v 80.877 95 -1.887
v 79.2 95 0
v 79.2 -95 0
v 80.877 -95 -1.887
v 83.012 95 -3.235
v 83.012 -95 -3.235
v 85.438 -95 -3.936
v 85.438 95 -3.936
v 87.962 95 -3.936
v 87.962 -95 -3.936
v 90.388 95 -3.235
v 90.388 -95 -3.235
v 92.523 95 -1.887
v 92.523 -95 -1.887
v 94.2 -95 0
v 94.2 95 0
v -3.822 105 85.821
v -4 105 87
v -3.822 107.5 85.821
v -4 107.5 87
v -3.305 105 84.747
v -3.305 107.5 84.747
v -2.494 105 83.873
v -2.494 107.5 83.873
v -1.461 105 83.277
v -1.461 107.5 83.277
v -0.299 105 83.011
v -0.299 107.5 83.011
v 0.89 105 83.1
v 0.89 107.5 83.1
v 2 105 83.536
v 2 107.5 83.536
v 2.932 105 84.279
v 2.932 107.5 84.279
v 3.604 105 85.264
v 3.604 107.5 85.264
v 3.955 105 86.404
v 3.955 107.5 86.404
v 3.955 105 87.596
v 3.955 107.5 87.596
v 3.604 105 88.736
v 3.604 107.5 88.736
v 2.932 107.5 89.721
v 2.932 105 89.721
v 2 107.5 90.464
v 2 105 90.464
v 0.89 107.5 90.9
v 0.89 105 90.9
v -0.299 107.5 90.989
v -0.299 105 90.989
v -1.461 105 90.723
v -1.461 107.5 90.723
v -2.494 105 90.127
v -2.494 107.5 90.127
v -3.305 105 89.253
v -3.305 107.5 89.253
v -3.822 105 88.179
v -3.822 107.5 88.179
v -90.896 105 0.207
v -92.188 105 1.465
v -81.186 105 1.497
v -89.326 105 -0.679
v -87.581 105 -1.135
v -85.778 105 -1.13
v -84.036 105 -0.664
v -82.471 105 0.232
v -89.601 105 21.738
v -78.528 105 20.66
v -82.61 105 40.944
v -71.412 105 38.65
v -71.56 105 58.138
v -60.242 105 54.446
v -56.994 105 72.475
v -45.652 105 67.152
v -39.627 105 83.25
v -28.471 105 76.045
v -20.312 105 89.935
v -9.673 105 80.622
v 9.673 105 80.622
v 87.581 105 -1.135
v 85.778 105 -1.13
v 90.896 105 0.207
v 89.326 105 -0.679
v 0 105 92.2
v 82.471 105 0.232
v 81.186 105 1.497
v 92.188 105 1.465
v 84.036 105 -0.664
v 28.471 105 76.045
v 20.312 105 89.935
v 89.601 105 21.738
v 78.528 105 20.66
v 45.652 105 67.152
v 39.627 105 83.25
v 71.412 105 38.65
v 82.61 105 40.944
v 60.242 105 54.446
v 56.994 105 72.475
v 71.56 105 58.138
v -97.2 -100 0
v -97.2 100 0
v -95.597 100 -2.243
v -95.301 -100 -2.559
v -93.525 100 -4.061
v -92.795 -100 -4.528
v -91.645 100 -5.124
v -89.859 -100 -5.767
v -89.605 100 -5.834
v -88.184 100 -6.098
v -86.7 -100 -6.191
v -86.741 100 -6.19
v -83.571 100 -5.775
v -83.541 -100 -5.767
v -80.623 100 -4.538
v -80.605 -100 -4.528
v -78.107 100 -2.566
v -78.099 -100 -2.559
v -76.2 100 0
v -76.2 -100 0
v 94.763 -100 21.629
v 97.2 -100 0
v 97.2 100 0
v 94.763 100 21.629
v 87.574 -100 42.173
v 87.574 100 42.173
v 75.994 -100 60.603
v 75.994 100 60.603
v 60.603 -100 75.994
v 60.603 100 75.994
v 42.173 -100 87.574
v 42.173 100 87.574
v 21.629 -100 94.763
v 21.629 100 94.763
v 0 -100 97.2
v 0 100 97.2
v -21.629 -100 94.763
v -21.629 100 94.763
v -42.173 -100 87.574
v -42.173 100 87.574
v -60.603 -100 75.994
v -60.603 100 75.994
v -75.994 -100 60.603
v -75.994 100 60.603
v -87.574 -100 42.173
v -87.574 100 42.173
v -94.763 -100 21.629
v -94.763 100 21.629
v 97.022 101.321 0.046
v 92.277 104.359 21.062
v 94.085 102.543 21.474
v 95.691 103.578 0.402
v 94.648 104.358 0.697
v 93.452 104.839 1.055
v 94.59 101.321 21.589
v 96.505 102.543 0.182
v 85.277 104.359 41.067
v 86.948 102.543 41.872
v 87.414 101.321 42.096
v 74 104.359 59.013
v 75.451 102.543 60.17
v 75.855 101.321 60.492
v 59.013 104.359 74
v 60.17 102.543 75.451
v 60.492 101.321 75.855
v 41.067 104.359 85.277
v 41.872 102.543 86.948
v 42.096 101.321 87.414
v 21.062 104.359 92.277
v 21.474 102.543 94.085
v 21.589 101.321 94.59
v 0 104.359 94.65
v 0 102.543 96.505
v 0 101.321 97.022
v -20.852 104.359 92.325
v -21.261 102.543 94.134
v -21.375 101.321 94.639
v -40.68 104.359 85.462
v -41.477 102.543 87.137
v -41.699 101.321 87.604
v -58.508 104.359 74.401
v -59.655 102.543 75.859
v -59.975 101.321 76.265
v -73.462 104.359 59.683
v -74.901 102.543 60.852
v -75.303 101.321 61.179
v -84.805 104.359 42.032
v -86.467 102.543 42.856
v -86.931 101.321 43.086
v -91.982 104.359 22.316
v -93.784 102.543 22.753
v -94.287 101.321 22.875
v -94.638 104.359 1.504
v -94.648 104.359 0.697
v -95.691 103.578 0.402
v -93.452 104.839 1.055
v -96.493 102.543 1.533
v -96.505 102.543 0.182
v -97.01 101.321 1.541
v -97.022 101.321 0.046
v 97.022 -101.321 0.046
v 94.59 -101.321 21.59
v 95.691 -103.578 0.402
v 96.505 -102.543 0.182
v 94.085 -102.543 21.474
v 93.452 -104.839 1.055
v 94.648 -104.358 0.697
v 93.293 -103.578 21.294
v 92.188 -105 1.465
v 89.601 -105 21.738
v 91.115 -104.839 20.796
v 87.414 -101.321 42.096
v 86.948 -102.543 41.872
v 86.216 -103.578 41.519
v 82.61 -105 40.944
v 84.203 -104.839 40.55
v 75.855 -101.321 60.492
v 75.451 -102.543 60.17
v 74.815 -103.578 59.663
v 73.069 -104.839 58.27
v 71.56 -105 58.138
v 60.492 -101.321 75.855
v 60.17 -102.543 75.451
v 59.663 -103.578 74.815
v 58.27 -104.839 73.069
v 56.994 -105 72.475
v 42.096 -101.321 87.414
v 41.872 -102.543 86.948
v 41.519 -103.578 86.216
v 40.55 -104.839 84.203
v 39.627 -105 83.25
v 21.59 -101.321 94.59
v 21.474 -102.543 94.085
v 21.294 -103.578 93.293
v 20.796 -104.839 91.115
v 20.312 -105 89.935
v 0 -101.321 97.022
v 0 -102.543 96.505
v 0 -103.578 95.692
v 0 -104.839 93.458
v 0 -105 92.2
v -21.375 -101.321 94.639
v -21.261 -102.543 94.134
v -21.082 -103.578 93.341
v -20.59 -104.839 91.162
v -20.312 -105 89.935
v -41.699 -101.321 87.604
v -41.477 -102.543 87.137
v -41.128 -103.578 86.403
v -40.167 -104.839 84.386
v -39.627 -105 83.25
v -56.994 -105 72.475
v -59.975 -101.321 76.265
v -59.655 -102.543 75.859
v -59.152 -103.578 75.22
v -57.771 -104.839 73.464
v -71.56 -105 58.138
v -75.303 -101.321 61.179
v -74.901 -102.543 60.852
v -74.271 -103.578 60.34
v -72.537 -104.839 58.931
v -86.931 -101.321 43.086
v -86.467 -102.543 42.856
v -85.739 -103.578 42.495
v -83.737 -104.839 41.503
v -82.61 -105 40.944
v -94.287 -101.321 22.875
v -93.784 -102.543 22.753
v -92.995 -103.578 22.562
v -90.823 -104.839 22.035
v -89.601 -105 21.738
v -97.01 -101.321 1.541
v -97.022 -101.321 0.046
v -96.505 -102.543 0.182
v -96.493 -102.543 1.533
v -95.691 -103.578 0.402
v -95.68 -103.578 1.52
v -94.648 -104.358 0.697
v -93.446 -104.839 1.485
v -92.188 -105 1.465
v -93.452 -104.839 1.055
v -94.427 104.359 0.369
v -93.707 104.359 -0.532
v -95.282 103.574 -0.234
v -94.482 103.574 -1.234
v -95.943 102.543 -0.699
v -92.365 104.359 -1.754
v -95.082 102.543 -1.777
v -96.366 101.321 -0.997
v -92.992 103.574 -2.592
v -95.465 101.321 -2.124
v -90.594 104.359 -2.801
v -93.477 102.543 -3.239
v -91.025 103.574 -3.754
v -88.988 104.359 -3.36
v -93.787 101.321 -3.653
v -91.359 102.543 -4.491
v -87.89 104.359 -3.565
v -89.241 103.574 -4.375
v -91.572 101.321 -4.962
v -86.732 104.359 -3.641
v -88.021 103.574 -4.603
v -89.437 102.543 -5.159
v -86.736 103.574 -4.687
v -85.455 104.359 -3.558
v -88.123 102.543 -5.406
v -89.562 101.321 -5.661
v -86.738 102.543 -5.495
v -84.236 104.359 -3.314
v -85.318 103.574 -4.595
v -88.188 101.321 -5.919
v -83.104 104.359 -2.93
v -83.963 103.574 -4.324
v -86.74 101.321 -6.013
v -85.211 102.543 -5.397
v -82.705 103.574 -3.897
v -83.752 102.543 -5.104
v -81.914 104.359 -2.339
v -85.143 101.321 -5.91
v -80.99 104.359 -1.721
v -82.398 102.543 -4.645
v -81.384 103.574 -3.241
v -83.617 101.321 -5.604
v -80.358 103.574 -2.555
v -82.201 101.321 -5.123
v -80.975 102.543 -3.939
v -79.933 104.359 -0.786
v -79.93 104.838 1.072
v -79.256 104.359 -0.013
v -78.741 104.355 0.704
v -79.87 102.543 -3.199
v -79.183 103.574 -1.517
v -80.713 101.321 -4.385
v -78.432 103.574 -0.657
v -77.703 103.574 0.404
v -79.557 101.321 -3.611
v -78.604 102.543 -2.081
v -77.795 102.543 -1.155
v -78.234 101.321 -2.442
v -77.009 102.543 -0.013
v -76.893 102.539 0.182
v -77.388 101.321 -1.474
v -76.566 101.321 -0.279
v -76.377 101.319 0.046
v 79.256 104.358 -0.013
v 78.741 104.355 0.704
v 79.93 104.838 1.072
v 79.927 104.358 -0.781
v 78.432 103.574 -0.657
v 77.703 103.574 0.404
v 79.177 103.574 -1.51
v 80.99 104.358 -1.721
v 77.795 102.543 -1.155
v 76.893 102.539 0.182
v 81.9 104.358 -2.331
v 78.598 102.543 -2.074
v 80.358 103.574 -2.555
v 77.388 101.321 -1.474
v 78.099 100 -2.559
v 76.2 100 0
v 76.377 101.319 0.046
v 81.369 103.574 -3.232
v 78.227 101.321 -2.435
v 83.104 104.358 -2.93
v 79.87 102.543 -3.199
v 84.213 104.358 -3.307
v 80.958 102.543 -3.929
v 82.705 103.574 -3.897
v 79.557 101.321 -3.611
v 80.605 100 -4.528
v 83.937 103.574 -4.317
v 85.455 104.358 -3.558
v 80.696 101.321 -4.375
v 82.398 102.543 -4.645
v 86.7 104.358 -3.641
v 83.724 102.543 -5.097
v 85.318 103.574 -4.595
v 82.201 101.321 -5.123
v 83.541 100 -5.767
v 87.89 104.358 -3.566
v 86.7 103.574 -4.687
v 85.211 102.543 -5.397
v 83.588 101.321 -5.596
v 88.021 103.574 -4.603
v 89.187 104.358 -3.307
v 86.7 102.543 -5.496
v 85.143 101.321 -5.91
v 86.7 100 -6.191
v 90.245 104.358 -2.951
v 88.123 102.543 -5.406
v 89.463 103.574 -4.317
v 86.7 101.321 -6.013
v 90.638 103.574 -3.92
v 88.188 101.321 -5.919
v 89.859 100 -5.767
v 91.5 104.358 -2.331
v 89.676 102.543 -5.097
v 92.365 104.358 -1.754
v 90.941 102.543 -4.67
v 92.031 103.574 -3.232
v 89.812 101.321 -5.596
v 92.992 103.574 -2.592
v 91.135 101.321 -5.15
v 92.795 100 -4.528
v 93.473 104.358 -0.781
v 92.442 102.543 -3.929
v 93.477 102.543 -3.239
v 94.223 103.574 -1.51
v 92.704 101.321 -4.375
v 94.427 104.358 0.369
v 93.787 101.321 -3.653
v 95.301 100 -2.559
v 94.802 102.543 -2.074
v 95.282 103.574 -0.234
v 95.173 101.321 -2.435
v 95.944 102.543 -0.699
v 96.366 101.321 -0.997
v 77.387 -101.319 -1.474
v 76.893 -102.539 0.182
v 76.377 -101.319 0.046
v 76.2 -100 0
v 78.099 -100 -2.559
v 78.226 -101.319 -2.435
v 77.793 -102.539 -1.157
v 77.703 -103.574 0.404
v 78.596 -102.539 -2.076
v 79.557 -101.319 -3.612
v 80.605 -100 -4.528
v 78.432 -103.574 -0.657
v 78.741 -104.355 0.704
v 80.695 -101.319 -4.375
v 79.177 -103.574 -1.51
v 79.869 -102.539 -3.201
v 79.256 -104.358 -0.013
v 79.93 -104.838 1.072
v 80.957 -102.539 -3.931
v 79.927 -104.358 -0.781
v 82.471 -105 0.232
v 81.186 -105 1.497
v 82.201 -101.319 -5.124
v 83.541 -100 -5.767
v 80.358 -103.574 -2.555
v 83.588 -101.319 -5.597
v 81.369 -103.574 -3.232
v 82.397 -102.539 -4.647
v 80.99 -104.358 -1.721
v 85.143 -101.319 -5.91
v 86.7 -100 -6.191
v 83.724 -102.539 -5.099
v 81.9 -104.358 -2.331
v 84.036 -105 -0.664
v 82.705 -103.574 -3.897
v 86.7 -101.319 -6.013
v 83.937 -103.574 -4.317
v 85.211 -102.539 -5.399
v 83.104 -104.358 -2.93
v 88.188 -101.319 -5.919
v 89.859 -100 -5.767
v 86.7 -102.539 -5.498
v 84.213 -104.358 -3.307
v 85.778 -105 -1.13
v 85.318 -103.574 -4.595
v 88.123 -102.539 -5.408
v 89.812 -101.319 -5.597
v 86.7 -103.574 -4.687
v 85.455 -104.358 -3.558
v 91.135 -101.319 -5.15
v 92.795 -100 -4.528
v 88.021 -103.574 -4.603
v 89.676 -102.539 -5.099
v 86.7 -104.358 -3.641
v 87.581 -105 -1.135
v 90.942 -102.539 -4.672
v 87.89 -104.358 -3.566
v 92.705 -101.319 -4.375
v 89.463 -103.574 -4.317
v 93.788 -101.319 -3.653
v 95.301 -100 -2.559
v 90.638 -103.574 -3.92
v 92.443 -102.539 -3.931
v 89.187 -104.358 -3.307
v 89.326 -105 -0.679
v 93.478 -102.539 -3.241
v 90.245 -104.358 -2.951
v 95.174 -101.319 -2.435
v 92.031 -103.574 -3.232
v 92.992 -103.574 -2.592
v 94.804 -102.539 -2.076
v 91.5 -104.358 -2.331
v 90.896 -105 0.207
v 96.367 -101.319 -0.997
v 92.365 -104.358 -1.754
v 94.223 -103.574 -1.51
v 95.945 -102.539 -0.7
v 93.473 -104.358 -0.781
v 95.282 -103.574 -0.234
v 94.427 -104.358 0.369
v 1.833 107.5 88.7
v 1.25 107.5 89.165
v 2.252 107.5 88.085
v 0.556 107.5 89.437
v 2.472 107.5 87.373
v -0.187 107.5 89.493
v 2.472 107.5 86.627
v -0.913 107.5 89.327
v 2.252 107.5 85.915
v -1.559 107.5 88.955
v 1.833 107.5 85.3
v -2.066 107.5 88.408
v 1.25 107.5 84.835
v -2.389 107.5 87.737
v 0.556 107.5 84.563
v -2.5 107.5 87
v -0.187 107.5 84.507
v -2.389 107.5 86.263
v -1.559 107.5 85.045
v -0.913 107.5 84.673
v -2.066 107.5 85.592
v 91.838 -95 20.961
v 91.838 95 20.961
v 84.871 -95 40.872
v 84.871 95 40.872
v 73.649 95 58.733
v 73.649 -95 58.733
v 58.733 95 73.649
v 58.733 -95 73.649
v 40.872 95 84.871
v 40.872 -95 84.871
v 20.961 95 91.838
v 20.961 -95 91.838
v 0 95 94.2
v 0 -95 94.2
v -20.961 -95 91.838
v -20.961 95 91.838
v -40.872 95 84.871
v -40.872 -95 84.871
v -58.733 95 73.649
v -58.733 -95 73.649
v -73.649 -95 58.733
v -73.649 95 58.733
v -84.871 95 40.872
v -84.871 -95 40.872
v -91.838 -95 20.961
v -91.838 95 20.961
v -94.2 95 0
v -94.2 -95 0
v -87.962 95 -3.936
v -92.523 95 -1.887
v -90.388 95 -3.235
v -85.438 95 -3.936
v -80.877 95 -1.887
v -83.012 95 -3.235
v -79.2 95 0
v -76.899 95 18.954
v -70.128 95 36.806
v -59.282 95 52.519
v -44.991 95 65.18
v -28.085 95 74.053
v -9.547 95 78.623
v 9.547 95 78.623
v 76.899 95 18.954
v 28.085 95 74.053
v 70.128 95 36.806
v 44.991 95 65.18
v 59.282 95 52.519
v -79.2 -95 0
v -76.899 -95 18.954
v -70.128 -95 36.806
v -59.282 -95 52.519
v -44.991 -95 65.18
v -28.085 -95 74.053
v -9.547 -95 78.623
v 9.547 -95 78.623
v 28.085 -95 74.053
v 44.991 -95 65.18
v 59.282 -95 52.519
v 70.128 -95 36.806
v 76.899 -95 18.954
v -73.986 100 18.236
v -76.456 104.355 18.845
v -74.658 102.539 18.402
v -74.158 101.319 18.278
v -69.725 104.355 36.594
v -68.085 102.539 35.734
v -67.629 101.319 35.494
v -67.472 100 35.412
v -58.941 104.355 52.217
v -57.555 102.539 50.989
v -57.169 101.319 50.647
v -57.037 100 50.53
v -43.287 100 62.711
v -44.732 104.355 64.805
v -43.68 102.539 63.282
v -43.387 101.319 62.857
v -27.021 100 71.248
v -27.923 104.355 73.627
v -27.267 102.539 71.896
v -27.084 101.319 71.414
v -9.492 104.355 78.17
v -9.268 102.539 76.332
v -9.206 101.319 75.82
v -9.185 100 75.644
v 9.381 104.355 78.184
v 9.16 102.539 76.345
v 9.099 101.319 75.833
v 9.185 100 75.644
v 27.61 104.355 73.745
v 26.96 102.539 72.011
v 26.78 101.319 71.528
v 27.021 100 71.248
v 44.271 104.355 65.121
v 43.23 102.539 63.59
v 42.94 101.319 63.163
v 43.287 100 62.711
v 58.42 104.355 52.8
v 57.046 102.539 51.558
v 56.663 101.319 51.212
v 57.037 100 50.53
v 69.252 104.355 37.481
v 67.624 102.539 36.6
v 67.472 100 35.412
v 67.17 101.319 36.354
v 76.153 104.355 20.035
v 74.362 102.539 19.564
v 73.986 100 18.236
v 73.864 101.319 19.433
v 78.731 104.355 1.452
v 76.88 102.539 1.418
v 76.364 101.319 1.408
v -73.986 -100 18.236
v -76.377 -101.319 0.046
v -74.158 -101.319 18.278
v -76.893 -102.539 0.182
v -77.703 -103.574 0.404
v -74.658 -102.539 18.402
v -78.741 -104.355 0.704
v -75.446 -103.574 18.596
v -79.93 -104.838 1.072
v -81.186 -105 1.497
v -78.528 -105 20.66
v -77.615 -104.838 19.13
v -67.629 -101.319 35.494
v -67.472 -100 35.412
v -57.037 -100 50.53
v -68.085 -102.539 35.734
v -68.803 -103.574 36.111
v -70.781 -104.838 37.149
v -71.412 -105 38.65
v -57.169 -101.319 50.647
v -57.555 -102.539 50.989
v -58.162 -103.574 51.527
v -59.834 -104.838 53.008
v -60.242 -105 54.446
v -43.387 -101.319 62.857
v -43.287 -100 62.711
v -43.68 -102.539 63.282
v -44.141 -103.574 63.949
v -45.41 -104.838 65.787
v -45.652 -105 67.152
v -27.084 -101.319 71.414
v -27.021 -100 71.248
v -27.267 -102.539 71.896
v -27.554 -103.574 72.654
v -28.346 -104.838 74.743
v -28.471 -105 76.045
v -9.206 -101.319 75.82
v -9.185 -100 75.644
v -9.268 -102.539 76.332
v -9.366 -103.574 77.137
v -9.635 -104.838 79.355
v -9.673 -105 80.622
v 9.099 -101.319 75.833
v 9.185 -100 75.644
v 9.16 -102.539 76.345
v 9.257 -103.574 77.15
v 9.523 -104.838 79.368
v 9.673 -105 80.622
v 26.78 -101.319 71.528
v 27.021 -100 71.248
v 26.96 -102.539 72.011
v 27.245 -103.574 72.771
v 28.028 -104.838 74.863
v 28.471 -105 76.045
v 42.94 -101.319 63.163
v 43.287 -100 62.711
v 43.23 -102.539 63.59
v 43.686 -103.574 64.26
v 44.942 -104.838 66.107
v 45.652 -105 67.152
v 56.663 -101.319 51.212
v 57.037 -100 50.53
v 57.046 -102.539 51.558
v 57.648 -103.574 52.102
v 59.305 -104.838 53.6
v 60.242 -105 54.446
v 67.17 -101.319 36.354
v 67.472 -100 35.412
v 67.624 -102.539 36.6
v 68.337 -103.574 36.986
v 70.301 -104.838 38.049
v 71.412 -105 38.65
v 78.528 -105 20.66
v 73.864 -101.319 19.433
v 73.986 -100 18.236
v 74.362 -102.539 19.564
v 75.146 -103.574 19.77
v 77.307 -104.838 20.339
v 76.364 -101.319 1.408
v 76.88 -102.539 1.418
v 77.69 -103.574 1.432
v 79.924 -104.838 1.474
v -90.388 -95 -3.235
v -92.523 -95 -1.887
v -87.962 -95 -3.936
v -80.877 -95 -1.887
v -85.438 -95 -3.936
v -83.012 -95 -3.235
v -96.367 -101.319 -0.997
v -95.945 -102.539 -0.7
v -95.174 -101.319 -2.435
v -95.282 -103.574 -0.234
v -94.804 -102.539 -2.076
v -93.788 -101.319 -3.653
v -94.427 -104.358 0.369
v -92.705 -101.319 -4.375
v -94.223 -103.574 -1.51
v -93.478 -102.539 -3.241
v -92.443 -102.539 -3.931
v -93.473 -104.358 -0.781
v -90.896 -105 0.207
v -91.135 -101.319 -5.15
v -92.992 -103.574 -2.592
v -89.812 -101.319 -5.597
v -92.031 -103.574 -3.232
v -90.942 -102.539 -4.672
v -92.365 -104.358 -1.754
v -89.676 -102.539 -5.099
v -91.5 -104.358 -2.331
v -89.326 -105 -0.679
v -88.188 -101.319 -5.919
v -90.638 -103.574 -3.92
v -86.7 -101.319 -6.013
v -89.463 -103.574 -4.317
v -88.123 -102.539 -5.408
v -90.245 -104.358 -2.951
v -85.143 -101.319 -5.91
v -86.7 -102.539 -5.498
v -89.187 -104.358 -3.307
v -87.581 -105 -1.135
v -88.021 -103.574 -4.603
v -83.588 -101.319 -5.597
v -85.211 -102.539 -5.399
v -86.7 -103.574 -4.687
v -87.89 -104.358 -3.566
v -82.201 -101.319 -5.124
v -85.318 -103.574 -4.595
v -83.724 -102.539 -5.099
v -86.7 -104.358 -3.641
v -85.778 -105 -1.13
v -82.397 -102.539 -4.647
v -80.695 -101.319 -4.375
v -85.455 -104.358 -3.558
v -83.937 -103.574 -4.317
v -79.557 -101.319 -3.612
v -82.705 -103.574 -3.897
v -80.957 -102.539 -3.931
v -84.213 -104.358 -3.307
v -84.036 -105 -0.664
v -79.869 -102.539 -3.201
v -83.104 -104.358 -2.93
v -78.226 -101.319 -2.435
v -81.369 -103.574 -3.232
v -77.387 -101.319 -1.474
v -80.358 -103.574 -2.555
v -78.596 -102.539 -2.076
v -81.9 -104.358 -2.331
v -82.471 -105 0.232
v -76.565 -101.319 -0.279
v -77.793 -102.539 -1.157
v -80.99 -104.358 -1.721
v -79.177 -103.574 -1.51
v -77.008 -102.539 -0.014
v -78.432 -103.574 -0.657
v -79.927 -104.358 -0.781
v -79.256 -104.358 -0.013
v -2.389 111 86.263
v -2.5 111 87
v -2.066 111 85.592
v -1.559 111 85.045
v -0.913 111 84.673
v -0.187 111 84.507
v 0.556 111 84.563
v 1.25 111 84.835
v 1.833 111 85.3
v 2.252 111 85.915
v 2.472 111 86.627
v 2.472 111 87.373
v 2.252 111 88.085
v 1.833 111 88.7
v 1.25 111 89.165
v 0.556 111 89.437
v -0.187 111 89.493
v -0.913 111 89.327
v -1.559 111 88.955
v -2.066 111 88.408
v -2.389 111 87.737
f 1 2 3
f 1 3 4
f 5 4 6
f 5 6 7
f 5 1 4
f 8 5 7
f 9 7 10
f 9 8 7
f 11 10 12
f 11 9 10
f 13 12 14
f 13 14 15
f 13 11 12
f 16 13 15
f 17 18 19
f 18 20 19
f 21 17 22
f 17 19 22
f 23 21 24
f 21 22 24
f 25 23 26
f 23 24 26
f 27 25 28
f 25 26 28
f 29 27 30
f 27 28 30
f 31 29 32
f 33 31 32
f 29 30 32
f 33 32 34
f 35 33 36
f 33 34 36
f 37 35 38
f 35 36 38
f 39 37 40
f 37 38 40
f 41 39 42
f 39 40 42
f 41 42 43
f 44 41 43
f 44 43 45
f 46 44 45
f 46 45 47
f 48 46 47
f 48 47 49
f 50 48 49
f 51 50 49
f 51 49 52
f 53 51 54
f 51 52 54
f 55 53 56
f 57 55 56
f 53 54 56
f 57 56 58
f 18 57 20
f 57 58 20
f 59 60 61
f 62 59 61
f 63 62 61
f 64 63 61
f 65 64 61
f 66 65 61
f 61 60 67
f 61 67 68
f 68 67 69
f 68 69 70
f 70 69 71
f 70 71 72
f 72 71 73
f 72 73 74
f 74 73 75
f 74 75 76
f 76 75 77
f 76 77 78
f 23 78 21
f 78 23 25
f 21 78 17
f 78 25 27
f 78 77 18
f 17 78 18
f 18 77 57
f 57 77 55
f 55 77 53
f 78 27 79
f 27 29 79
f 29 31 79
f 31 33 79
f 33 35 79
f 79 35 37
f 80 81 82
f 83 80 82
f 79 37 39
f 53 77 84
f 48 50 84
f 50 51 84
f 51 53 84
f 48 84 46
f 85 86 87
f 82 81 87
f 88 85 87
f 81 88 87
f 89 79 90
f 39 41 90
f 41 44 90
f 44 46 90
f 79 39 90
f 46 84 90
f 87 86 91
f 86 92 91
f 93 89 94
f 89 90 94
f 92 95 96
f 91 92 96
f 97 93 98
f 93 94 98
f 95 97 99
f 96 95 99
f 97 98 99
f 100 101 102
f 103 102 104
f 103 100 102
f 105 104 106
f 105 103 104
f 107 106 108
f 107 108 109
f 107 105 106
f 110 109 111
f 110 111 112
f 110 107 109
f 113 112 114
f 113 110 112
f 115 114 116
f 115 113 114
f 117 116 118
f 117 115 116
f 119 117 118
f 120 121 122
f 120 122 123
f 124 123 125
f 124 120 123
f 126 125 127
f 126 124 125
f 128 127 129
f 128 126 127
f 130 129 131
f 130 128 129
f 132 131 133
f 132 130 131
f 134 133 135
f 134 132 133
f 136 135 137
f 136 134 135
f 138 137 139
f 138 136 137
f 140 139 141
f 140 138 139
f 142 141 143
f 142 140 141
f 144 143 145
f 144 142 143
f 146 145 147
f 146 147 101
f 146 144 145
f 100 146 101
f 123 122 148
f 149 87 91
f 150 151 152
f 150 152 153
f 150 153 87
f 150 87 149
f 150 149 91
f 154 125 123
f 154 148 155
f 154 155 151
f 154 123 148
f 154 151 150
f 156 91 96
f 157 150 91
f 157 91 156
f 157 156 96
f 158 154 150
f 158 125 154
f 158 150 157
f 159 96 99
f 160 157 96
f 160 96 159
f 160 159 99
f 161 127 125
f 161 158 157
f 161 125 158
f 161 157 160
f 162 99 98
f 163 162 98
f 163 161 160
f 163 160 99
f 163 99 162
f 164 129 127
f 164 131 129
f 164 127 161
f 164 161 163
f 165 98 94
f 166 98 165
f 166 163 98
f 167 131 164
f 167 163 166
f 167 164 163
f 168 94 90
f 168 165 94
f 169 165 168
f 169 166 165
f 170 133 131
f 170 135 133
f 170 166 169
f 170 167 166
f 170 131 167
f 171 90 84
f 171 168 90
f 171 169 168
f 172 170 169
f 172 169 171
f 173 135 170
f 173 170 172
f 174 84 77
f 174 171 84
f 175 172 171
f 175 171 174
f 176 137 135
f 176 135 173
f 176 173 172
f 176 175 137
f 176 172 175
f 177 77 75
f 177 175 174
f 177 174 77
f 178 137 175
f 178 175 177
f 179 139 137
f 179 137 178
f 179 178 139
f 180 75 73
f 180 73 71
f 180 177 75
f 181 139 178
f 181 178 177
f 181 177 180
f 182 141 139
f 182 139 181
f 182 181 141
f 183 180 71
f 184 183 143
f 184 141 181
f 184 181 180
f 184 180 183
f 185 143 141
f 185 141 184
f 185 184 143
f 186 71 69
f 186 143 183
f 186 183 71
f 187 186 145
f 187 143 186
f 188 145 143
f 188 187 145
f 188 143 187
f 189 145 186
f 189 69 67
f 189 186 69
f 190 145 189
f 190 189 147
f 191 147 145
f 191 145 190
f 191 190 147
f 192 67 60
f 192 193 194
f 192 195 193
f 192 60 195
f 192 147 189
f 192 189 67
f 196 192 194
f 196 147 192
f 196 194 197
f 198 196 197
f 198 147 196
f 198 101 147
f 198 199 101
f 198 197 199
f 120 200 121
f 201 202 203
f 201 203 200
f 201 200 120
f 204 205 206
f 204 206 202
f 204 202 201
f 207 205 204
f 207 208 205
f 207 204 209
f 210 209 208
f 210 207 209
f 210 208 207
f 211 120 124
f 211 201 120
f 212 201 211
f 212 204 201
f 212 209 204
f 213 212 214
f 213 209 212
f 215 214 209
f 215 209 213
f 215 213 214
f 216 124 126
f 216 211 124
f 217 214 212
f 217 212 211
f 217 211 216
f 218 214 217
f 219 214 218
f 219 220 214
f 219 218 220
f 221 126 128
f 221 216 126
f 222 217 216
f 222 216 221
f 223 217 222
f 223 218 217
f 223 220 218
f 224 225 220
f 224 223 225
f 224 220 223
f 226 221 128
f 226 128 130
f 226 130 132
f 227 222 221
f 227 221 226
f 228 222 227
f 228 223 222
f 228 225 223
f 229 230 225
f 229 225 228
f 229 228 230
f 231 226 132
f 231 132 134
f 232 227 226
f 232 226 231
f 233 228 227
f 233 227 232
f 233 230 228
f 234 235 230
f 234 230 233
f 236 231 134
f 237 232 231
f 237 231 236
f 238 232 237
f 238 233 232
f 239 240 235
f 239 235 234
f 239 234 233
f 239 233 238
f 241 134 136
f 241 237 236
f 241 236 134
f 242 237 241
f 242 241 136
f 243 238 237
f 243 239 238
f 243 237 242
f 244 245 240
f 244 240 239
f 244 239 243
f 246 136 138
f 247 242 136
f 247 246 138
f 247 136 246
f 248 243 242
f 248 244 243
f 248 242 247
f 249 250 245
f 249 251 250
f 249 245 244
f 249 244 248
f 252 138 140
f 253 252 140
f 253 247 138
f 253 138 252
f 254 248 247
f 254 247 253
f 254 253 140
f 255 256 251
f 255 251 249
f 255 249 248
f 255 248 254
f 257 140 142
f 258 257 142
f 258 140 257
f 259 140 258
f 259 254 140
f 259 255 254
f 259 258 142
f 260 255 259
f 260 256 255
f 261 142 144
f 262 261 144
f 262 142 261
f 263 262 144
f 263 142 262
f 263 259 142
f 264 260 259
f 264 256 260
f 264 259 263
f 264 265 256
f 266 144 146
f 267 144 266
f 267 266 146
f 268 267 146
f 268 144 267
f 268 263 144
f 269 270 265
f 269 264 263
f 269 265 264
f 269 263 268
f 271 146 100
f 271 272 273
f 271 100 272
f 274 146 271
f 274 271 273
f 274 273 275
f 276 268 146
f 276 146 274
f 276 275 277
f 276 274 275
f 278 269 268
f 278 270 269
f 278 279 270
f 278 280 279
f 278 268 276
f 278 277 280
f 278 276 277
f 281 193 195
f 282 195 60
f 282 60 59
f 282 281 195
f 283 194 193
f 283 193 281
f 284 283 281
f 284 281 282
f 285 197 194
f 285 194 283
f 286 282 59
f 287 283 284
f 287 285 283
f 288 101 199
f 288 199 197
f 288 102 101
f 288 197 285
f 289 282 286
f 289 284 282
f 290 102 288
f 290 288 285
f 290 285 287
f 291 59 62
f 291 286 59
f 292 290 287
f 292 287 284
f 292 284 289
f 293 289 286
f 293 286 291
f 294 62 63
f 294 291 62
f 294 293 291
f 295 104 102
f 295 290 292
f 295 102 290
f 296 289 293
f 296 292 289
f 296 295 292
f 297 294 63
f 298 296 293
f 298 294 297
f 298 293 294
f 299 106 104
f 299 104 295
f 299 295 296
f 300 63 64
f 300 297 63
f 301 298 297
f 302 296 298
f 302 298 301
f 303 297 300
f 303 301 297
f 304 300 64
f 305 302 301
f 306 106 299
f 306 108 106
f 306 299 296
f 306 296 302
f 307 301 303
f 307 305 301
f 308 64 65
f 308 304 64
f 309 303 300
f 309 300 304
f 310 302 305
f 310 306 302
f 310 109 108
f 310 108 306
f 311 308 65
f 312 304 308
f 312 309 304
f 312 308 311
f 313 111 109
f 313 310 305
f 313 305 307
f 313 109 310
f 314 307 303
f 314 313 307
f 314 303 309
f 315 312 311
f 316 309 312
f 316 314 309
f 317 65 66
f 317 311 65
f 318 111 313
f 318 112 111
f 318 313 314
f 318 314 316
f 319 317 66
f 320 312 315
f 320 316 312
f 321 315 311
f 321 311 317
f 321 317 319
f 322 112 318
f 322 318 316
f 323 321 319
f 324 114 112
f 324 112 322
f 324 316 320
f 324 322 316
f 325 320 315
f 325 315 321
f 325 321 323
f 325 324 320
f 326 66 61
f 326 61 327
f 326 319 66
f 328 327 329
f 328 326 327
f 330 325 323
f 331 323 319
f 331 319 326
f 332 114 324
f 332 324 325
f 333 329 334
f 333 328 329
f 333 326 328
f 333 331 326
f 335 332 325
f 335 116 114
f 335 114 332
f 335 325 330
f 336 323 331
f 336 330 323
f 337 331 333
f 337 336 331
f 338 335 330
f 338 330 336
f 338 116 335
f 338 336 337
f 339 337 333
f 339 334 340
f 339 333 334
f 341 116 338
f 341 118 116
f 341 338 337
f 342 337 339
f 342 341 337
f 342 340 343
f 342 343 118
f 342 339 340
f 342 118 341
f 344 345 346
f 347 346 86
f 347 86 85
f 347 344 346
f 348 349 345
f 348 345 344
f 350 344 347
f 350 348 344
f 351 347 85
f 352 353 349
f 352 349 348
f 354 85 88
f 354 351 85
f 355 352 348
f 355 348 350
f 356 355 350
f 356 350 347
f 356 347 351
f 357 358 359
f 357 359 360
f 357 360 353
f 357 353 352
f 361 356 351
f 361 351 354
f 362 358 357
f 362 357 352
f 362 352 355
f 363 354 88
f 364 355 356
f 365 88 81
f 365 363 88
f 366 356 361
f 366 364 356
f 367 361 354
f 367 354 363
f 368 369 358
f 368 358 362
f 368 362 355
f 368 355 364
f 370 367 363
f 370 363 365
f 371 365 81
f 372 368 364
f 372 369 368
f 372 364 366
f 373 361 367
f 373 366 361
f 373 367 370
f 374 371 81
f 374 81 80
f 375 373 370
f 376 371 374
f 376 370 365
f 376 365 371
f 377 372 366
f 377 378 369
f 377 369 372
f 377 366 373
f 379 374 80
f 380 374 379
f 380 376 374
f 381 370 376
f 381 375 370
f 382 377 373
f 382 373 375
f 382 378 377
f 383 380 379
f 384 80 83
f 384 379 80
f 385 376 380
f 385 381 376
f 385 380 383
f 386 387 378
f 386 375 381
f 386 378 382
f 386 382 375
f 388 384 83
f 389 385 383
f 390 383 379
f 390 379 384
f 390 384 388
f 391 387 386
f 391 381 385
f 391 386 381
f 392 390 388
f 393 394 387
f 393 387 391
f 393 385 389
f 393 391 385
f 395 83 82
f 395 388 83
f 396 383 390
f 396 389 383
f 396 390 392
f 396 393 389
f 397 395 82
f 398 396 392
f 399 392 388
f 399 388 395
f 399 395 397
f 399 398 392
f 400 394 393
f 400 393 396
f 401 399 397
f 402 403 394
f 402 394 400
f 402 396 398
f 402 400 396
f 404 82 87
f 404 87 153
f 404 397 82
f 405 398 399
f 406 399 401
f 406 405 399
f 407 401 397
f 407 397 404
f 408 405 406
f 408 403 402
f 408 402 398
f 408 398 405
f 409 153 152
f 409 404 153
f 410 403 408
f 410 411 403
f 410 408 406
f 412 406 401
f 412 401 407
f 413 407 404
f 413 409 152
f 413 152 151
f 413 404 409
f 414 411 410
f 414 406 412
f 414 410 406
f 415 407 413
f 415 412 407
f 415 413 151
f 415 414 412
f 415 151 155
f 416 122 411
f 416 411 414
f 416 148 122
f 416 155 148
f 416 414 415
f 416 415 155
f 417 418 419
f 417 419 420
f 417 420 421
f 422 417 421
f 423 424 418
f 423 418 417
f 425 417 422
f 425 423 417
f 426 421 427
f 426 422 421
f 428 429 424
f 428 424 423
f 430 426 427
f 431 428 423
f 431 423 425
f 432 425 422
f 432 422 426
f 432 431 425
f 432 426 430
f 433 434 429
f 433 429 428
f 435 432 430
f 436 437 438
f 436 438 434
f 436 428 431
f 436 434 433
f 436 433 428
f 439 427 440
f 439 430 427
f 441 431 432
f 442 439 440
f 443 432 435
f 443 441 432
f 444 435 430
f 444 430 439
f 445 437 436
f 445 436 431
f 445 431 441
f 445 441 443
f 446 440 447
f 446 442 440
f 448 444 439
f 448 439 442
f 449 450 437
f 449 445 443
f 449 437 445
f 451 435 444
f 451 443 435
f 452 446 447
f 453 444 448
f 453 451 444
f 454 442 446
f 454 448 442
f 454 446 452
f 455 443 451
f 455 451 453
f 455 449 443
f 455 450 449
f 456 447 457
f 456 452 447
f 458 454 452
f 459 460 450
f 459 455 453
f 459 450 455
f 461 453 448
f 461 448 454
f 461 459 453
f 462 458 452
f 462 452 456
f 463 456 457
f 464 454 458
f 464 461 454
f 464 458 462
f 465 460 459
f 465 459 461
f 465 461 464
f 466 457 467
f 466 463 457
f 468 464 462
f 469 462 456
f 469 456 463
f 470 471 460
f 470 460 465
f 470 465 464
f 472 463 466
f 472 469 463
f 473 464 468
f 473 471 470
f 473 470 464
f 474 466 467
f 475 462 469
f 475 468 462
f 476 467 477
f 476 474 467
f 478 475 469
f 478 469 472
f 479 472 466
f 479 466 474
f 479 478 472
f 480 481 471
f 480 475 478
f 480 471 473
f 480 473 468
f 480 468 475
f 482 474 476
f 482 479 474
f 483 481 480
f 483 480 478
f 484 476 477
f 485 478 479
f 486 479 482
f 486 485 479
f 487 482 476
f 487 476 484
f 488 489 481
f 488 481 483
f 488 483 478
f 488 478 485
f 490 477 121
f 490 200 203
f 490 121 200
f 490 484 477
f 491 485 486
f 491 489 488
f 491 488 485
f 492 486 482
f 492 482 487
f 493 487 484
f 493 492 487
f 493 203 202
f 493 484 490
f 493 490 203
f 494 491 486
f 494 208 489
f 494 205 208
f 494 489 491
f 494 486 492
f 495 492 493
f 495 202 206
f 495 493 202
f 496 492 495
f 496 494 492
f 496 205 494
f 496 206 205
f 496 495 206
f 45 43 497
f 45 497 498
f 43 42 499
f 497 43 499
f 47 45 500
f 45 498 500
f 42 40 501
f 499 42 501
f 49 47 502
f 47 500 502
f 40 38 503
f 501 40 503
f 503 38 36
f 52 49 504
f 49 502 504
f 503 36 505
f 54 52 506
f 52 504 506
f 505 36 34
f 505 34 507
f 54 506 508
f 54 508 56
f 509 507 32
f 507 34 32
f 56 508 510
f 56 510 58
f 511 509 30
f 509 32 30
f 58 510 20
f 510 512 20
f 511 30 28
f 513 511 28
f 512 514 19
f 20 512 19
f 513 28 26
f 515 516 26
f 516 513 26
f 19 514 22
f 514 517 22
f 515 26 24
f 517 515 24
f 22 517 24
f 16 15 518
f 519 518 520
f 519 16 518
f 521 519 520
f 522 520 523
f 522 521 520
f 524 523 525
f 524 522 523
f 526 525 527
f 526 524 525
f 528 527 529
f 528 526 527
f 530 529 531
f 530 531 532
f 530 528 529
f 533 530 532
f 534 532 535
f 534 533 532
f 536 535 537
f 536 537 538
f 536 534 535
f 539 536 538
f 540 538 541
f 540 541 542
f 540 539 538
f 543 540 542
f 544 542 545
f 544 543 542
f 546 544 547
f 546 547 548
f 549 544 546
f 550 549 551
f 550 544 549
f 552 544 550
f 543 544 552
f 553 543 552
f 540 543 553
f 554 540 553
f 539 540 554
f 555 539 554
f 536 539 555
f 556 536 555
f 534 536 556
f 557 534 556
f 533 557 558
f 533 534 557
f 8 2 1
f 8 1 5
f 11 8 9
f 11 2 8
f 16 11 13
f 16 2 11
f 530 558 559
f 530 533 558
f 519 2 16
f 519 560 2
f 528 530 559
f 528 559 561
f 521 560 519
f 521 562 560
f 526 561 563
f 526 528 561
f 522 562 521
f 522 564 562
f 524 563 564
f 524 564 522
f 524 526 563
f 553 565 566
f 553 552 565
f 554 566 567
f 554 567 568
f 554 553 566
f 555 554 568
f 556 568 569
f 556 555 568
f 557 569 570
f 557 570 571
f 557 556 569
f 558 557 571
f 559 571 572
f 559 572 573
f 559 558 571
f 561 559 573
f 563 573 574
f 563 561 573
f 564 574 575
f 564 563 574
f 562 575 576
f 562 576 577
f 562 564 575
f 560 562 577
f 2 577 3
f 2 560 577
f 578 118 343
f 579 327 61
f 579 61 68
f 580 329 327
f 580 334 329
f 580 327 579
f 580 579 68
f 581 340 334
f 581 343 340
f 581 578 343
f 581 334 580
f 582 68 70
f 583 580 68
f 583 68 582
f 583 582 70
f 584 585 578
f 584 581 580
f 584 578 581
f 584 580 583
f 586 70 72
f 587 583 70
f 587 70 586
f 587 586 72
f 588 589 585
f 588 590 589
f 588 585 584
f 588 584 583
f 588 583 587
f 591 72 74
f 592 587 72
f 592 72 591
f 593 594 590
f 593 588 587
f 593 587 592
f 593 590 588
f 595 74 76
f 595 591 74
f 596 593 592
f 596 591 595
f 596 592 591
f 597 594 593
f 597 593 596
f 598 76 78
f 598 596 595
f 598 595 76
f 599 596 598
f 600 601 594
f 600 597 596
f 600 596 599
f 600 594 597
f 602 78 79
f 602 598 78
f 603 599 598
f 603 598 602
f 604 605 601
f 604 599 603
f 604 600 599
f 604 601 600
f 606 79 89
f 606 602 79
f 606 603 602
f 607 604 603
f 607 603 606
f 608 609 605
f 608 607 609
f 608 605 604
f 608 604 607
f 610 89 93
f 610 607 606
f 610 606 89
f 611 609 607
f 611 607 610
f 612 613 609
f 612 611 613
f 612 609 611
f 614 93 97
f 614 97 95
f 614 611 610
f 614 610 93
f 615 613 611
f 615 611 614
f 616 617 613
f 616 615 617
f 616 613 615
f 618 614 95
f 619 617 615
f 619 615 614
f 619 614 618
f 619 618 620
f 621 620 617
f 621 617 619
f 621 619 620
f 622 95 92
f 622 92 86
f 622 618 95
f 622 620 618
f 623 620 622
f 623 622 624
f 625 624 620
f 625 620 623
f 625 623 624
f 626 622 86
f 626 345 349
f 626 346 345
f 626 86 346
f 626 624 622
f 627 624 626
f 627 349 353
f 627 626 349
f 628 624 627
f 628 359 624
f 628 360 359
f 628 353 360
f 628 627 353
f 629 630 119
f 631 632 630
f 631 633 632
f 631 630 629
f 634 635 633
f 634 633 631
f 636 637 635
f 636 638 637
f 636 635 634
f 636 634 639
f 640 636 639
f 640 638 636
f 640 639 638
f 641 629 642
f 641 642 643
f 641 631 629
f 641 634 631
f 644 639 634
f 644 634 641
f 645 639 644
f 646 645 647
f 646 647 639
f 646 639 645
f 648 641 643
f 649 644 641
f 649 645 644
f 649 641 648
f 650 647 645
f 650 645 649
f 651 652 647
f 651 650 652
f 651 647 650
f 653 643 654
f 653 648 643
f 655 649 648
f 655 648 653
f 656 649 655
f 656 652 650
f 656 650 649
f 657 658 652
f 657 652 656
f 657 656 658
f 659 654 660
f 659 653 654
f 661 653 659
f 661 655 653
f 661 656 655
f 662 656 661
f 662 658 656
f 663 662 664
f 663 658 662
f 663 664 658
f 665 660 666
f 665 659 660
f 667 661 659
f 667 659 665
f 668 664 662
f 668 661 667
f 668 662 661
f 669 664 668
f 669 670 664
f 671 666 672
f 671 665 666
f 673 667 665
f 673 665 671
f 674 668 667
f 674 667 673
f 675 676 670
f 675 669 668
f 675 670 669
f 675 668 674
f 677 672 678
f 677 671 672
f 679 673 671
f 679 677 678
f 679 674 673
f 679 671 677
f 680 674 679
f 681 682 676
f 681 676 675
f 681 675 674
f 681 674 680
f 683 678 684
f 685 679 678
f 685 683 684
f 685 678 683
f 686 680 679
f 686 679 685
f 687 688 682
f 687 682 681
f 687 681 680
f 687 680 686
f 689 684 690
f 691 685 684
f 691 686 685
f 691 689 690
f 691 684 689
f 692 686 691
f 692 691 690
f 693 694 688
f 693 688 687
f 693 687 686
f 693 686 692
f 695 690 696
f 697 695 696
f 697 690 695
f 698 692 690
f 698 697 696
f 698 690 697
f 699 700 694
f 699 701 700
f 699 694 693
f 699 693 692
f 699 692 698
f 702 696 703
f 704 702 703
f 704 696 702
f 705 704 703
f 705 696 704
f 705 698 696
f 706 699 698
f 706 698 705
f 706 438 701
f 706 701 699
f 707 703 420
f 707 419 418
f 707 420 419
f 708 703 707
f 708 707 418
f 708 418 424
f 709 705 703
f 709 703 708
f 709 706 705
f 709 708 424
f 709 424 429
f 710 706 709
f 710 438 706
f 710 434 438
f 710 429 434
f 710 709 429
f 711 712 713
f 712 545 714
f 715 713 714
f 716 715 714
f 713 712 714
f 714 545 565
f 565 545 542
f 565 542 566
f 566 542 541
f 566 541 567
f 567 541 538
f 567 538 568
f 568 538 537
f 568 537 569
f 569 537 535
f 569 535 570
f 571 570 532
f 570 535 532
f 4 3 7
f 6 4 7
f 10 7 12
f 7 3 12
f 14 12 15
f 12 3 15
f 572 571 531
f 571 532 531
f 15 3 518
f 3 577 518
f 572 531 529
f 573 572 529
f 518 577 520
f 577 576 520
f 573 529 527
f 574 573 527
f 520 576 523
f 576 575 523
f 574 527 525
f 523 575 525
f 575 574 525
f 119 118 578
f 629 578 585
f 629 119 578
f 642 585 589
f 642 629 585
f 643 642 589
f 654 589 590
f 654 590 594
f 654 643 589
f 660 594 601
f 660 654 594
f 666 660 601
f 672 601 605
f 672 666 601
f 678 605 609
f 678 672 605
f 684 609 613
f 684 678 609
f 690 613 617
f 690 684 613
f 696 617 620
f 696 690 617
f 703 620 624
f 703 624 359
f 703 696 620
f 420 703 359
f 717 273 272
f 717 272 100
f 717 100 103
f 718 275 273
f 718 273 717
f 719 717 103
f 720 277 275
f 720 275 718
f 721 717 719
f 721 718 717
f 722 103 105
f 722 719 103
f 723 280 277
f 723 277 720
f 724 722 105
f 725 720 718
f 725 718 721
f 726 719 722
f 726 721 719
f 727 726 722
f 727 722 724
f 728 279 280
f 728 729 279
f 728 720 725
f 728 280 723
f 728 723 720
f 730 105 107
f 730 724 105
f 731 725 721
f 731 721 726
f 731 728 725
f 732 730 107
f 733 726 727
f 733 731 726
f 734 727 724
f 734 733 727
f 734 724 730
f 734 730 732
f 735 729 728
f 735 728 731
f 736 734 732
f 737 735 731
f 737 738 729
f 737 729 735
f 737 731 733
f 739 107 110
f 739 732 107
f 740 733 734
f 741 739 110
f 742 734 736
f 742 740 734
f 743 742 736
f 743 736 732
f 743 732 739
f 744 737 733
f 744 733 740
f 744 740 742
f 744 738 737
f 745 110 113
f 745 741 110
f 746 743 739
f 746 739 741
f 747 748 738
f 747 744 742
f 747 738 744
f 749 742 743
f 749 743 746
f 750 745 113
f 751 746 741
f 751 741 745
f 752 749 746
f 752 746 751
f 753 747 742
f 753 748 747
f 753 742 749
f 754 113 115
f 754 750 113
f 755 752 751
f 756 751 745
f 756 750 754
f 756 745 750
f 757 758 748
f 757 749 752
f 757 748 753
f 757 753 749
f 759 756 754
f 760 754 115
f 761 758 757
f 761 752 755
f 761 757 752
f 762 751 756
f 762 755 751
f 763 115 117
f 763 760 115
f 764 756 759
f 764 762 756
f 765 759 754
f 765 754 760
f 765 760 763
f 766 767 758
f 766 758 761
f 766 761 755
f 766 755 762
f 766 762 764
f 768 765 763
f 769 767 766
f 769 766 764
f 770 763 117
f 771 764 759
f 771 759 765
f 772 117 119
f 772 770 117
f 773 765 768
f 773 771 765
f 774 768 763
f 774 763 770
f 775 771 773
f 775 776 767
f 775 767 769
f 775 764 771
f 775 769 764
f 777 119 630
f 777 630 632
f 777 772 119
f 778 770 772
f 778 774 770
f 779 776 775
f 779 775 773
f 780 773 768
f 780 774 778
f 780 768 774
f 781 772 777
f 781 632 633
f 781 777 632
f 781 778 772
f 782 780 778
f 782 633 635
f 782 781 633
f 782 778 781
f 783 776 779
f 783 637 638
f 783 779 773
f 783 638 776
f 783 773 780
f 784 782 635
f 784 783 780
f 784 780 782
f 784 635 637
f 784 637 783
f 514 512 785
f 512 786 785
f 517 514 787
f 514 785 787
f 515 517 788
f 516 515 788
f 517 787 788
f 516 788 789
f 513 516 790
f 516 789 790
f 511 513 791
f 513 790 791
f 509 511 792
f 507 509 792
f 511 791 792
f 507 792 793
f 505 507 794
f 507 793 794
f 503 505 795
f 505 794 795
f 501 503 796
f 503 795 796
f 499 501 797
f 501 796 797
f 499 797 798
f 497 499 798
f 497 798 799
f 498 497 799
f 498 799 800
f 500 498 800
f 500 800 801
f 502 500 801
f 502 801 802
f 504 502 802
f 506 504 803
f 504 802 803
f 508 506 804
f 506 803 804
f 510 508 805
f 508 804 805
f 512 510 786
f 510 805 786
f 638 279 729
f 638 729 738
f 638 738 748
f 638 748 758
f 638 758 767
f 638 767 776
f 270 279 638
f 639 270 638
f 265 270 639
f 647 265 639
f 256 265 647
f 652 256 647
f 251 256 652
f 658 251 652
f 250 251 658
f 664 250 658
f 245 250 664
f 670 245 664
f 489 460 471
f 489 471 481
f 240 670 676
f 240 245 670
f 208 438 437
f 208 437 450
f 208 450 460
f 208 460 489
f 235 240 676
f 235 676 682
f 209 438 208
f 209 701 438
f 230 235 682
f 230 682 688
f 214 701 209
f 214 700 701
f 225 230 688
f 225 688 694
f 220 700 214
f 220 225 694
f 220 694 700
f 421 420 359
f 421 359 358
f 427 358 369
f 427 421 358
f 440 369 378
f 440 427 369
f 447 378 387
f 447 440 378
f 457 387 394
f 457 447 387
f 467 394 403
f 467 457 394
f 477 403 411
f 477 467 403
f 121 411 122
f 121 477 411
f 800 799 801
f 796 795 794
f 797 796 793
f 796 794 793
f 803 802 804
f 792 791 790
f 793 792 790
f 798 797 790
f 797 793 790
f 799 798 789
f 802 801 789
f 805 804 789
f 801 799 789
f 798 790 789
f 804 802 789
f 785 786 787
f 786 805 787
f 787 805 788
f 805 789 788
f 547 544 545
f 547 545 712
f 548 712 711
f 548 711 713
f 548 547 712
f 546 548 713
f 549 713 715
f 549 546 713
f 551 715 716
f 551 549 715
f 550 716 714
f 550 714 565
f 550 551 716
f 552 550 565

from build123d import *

# Parameters (mm, degrees)
BOSS_EXTRUDE1_DEPTH  = 95
BOSS_EXTRUDE2_DEPTH  = 10
FILLET2_R            = 5
FILLET2_OF_MIRROR1_R = 5


with BuildPart() as part:
    # Sketch1 → Boss-Extrude1 (new, symmetric)
    with BuildSketch(Plane(origin=(0, 0, 0), x_dir=(1, 0, 0), z_dir=(0, 1, 0))):
        with BuildLine():
            ThreePointArc((-76.2, 0), (0, -76.2), (76.2, 0))
            ThreePointArc((76.2, 0), (86.7, 6.190524981), (97.2, 0))
            ThreePointArc((97.2, 0), (0, -97.2), (-97.2, 0))
            ThreePointArc((-97.2, 0), (-86.7, 6.190524981), (-76.2, 0))
        make_face()
        with BuildLine():
            ThreePointArc((-79.2, 0), (0, -79.2), (79.2, 0))
            ThreePointArc((79.2, 0), (86.7, 4.025062814), (94.2, 0))
            ThreePointArc((94.2, 0), (0, -94.2), (-94.2, 0))
            ThreePointArc((-94.2, 0), (-86.7, 4.025062814), (-79.2, 0))
        make_face(mode=Mode.SUBTRACT)
    extrude(amount=BOSS_EXTRUDE1_DEPTH, both=True)

    # Sketch6 → Boss-Extrude2 (add)
    with BuildSketch(Plane.XZ.offset(95)):
        with BuildLine():
            ThreePointArc((76.2, 0), (86.7, -6.190524981), (97.2, 0))
            ThreePointArc((97.2, 0), (0, 97.2), (-97.2, 0))
            ThreePointArc((-97.2, 0), (-86.7, -6.190524981), (-76.2, 0))
            ThreePointArc((-76.2, 0), (0, 76.2), (76.2, 0))
        make_face()
    boss_extrude2 = extrude(amount=BOSS_EXTRUDE2_DEPTH)

    # Fillet2
    # the kernel refuses this fillet: 5 mm, written as the material it takes off along each edge
    with BuildSketch(Plane(origin=(0, -105, 0), x_dir=(-0.9978410654682823, 0, -0.06567501857725805), z_dir=(0.06567501857725805, 0, -0.9978410654682823))) as fillet2_piece_1:
        with BuildLine():
            CenterArc((76.2 + FILLET2_R, FILLET2_R), FILLET2_R, 180, 90)
            Line((76.2 + FILLET2_R, 0), (76.2 + FILLET2_R, -FILLET2_R * 0.02))
            Line((76.2 + FILLET2_R, -FILLET2_R * 0.02), (76.2 - FILLET2_R * 0.02, -FILLET2_R * 0.02))
            Line((76.2 - FILLET2_R * 0.02, -FILLET2_R * 0.02), (76.2 - FILLET2_R * 0.02, FILLET2_R))
            Line((76.2 - FILLET2_R * 0.02, FILLET2_R), (76.2, FILLET2_R))
        make_face()
    revolve(axis=Axis((0, -105, 0), (0, 1, 0)), revolution_arc=187.531223354, mode=Mode.SUBTRACT)
    with BuildSketch(Plane(origin=(86.7, -105, 5.809475019), x_dir=(-0.9960965214021965, 0, -0.08827072023294943), z_dir=(-0.08827072023294943, 0, 0.9960965214021965))) as fillet2_piece_2:
        with BuildLine():
            CenterArc((12 - FILLET2_R, -FILLET2_R), FILLET2_R, 0, 90)
            Line((12 - FILLET2_R, 0), (12 - FILLET2_R, FILLET2_R * 0.02))
            Line((12 - FILLET2_R, FILLET2_R * 0.02), (12 + FILLET2_R * 0.02, FILLET2_R * 0.02))
            Line((12 + FILLET2_R * 0.02, FILLET2_R * 0.02), (12 + FILLET2_R * 0.02, -FILLET2_R))
            Line((12 + FILLET2_R * 0.02, -FILLET2_R), (12, -FILLET2_R))
        make_face()
    revolve(axis=Axis((86.7, -105, 5.809475019), (0, -1, 0)), revolution_arc=169.871738636, mode=Mode.SUBTRACT)
    with BuildSketch(Plane(origin=(0, -105, 0), x_dir=(0.9986729810025154, 0, -0.05150026228622047), z_dir=(-0.05150026228622047, 0, -0.9986729810025154))) as fillet2_piece_3:
        with BuildLine():
            CenterArc((97.2 - FILLET2_R, -FILLET2_R), FILLET2_R, 0, 90)
            Line((97.2, -FILLET2_R), (97.2 + FILLET2_R * 0.02, -FILLET2_R))
            Line((97.2 + FILLET2_R * 0.02, -FILLET2_R), (97.2 + FILLET2_R * 0.02, FILLET2_R * 0.02))
            Line((97.2 + FILLET2_R * 0.02, FILLET2_R * 0.02), (97.2 - FILLET2_R, FILLET2_R * 0.02))
            Line((97.2 - FILLET2_R, FILLET2_R * 0.02), (97.2 - FILLET2_R, 0))
        make_face()
    revolve(axis=Axis((0, -105, 0), (0, -1, 0)), revolution_arc=185.904107198, mode=Mode.SUBTRACT)
    with BuildSketch(Plane(origin=(-86.7, -105, 5.809475019), x_dir=(-0.9960965214021962, 0, -0.08827072023295163), z_dir=(-0.08827072023295163, 0, 0.9960965214021962))) as fillet2_piece_4:
        with BuildLine():
            CenterArc((12 - FILLET2_R, -FILLET2_R), FILLET2_R, 0, 90)
            Line((12 - FILLET2_R, 0), (12 - FILLET2_R, FILLET2_R * 0.02))
            Line((12 - FILLET2_R, FILLET2_R * 0.02), (12 + FILLET2_R * 0.02, FILLET2_R * 0.02))
            Line((12 + FILLET2_R * 0.02, FILLET2_R * 0.02), (12 + FILLET2_R * 0.02, -FILLET2_R))
            Line((12 + FILLET2_R * 0.02, -FILLET2_R), (12, -FILLET2_R))
        make_face()
    revolve(axis=Axis((-86.7, -105, 5.809475019), (0, -1, 0)), revolution_arc=169.871738636, mode=Mode.SUBTRACT)

    # Mirror1: Boss-Extrude2 across plane
    add(boss_extrude2.mirror(Plane.ZX))

    # Fillet2 of Mirror1
    # the kernel refuses this fillet: 5 mm, written as the material it takes off along each edge
    with BuildSketch(Plane(origin=(0, 105, 0), x_dir=(-0.9978410654682823, 0, -0.06567501857725805), z_dir=(0.06567501857725805, 0, -0.9978410654682823))) as fillet2_of_mirror1_piece_1:
        with BuildLine():
            CenterArc((76.2 + FILLET2_OF_MIRROR1_R, -FILLET2_OF_MIRROR1_R), FILLET2_OF_MIRROR1_R, 90, 90)
            Line((76.2, -FILLET2_OF_MIRROR1_R), (76.2 - FILLET2_OF_MIRROR1_R * 0.02, -FILLET2_OF_MIRROR1_R))
            Line((76.2 - FILLET2_OF_MIRROR1_R * 0.02, -FILLET2_OF_MIRROR1_R), (76.2 - FILLET2_OF_MIRROR1_R * 0.02, FILLET2_OF_MIRROR1_R * 0.02))
            Line((76.2 - FILLET2_OF_MIRROR1_R * 0.02, FILLET2_OF_MIRROR1_R * 0.02), (76.2 + FILLET2_OF_MIRROR1_R, FILLET2_OF_MIRROR1_R * 0.02))
            Line((76.2 + FILLET2_OF_MIRROR1_R, FILLET2_OF_MIRROR1_R * 0.02), (76.2 + FILLET2_OF_MIRROR1_R, 0))
        make_face()
    revolve(axis=Axis((0, 105, 0), (0, 1, 0)), revolution_arc=187.531223354, mode=Mode.SUBTRACT)
    with BuildSketch(Plane(origin=(86.7, 105, 5.809475019), x_dir=(-0.9960965214021965, 0, -0.08827072023294943), z_dir=(-0.08827072023294943, 0, 0.9960965214021965))) as fillet2_of_mirror1_piece_2:
        with BuildLine():
            CenterArc((12 - FILLET2_OF_MIRROR1_R, FILLET2_OF_MIRROR1_R), FILLET2_OF_MIRROR1_R, 270, 90)
            Line((12, FILLET2_OF_MIRROR1_R), (12 + FILLET2_OF_MIRROR1_R * 0.02, FILLET2_OF_MIRROR1_R))
            Line((12 + FILLET2_OF_MIRROR1_R * 0.02, FILLET2_OF_MIRROR1_R), (12 + FILLET2_OF_MIRROR1_R * 0.02, -FILLET2_OF_MIRROR1_R * 0.02))
            Line((12 + FILLET2_OF_MIRROR1_R * 0.02, -FILLET2_OF_MIRROR1_R * 0.02), (12 - FILLET2_OF_MIRROR1_R, -FILLET2_OF_MIRROR1_R * 0.02))
            Line((12 - FILLET2_OF_MIRROR1_R, -FILLET2_OF_MIRROR1_R * 0.02), (12 - FILLET2_OF_MIRROR1_R, 0))
        make_face()
    revolve(axis=Axis((86.7, 105, 5.809475019), (0, -1, 0)), revolution_arc=169.871738636, mode=Mode.SUBTRACT)
    with BuildSketch(Plane(origin=(0, 105, 0), x_dir=(0.9986729810025154, 0, -0.05150026228622047), z_dir=(-0.05150026228622047, 0, -0.9986729810025154))) as fillet2_of_mirror1_piece_3:
        with BuildLine():
            CenterArc((97.2 - FILLET2_OF_MIRROR1_R, FILLET2_OF_MIRROR1_R), FILLET2_OF_MIRROR1_R, 270, 90)
            Line((97.2, FILLET2_OF_MIRROR1_R), (97.2 + FILLET2_OF_MIRROR1_R * 0.02, FILLET2_OF_MIRROR1_R))
            Line((97.2 + FILLET2_OF_MIRROR1_R * 0.02, FILLET2_OF_MIRROR1_R), (97.2 + FILLET2_OF_MIRROR1_R * 0.02, -FILLET2_OF_MIRROR1_R * 0.02))
            Line((97.2 + FILLET2_OF_MIRROR1_R * 0.02, -FILLET2_OF_MIRROR1_R * 0.02), (97.2 - FILLET2_OF_MIRROR1_R, -FILLET2_OF_MIRROR1_R * 0.02))
            Line((97.2 - FILLET2_OF_MIRROR1_R, -FILLET2_OF_MIRROR1_R * 0.02), (97.2 - FILLET2_OF_MIRROR1_R, 0))
        make_face()
    revolve(axis=Axis((0, 105, 0), (0, -1, 0)), revolution_arc=185.904107198, mode=Mode.SUBTRACT)
    with BuildSketch(Plane(origin=(-86.7, 105, 5.809475019), x_dir=(-0.9960965214021962, 0, -0.08827072023295163), z_dir=(-0.08827072023295163, 0, 0.9960965214021962))) as fillet2_of_mirror1_piece_4:
        with BuildLine():
            CenterArc((12 - FILLET2_OF_MIRROR1_R, FILLET2_OF_MIRROR1_R), FILLET2_OF_MIRROR1_R, 270, 90)
            Line((12 - FILLET2_OF_MIRROR1_R, 0), (12 - FILLET2_OF_MIRROR1_R, -FILLET2_OF_MIRROR1_R * 0.02))
            Line((12 - FILLET2_OF_MIRROR1_R, -FILLET2_OF_MIRROR1_R * 0.02), (12 + FILLET2_OF_MIRROR1_R * 0.02, -FILLET2_OF_MIRROR1_R * 0.02))
            Line((12 + FILLET2_OF_MIRROR1_R * 0.02, -FILLET2_OF_MIRROR1_R * 0.02), (12 + FILLET2_OF_MIRROR1_R * 0.02, FILLET2_OF_MIRROR1_R))
            Line((12 + FILLET2_OF_MIRROR1_R * 0.02, FILLET2_OF_MIRROR1_R), (12, FILLET2_OF_MIRROR1_R))
        make_face()
    revolve(axis=Axis((-86.7, 105, 5.809475019), (0, -1, 0)), revolution_arc=169.871738636, mode=Mode.SUBTRACT)

    # Sketch9 → Revolve1 (revolve)
    with BuildSketch(Plane.XY.offset(87)):
        Polygon((-4, 105), (-4, 107.5), (-2.5, 107.5), (-2.5, 111), (0, 111), (0, 105), align=None)
    revolve(axis=Axis((0, 111, 87), (0, -1, 0)))


solid = part.part
